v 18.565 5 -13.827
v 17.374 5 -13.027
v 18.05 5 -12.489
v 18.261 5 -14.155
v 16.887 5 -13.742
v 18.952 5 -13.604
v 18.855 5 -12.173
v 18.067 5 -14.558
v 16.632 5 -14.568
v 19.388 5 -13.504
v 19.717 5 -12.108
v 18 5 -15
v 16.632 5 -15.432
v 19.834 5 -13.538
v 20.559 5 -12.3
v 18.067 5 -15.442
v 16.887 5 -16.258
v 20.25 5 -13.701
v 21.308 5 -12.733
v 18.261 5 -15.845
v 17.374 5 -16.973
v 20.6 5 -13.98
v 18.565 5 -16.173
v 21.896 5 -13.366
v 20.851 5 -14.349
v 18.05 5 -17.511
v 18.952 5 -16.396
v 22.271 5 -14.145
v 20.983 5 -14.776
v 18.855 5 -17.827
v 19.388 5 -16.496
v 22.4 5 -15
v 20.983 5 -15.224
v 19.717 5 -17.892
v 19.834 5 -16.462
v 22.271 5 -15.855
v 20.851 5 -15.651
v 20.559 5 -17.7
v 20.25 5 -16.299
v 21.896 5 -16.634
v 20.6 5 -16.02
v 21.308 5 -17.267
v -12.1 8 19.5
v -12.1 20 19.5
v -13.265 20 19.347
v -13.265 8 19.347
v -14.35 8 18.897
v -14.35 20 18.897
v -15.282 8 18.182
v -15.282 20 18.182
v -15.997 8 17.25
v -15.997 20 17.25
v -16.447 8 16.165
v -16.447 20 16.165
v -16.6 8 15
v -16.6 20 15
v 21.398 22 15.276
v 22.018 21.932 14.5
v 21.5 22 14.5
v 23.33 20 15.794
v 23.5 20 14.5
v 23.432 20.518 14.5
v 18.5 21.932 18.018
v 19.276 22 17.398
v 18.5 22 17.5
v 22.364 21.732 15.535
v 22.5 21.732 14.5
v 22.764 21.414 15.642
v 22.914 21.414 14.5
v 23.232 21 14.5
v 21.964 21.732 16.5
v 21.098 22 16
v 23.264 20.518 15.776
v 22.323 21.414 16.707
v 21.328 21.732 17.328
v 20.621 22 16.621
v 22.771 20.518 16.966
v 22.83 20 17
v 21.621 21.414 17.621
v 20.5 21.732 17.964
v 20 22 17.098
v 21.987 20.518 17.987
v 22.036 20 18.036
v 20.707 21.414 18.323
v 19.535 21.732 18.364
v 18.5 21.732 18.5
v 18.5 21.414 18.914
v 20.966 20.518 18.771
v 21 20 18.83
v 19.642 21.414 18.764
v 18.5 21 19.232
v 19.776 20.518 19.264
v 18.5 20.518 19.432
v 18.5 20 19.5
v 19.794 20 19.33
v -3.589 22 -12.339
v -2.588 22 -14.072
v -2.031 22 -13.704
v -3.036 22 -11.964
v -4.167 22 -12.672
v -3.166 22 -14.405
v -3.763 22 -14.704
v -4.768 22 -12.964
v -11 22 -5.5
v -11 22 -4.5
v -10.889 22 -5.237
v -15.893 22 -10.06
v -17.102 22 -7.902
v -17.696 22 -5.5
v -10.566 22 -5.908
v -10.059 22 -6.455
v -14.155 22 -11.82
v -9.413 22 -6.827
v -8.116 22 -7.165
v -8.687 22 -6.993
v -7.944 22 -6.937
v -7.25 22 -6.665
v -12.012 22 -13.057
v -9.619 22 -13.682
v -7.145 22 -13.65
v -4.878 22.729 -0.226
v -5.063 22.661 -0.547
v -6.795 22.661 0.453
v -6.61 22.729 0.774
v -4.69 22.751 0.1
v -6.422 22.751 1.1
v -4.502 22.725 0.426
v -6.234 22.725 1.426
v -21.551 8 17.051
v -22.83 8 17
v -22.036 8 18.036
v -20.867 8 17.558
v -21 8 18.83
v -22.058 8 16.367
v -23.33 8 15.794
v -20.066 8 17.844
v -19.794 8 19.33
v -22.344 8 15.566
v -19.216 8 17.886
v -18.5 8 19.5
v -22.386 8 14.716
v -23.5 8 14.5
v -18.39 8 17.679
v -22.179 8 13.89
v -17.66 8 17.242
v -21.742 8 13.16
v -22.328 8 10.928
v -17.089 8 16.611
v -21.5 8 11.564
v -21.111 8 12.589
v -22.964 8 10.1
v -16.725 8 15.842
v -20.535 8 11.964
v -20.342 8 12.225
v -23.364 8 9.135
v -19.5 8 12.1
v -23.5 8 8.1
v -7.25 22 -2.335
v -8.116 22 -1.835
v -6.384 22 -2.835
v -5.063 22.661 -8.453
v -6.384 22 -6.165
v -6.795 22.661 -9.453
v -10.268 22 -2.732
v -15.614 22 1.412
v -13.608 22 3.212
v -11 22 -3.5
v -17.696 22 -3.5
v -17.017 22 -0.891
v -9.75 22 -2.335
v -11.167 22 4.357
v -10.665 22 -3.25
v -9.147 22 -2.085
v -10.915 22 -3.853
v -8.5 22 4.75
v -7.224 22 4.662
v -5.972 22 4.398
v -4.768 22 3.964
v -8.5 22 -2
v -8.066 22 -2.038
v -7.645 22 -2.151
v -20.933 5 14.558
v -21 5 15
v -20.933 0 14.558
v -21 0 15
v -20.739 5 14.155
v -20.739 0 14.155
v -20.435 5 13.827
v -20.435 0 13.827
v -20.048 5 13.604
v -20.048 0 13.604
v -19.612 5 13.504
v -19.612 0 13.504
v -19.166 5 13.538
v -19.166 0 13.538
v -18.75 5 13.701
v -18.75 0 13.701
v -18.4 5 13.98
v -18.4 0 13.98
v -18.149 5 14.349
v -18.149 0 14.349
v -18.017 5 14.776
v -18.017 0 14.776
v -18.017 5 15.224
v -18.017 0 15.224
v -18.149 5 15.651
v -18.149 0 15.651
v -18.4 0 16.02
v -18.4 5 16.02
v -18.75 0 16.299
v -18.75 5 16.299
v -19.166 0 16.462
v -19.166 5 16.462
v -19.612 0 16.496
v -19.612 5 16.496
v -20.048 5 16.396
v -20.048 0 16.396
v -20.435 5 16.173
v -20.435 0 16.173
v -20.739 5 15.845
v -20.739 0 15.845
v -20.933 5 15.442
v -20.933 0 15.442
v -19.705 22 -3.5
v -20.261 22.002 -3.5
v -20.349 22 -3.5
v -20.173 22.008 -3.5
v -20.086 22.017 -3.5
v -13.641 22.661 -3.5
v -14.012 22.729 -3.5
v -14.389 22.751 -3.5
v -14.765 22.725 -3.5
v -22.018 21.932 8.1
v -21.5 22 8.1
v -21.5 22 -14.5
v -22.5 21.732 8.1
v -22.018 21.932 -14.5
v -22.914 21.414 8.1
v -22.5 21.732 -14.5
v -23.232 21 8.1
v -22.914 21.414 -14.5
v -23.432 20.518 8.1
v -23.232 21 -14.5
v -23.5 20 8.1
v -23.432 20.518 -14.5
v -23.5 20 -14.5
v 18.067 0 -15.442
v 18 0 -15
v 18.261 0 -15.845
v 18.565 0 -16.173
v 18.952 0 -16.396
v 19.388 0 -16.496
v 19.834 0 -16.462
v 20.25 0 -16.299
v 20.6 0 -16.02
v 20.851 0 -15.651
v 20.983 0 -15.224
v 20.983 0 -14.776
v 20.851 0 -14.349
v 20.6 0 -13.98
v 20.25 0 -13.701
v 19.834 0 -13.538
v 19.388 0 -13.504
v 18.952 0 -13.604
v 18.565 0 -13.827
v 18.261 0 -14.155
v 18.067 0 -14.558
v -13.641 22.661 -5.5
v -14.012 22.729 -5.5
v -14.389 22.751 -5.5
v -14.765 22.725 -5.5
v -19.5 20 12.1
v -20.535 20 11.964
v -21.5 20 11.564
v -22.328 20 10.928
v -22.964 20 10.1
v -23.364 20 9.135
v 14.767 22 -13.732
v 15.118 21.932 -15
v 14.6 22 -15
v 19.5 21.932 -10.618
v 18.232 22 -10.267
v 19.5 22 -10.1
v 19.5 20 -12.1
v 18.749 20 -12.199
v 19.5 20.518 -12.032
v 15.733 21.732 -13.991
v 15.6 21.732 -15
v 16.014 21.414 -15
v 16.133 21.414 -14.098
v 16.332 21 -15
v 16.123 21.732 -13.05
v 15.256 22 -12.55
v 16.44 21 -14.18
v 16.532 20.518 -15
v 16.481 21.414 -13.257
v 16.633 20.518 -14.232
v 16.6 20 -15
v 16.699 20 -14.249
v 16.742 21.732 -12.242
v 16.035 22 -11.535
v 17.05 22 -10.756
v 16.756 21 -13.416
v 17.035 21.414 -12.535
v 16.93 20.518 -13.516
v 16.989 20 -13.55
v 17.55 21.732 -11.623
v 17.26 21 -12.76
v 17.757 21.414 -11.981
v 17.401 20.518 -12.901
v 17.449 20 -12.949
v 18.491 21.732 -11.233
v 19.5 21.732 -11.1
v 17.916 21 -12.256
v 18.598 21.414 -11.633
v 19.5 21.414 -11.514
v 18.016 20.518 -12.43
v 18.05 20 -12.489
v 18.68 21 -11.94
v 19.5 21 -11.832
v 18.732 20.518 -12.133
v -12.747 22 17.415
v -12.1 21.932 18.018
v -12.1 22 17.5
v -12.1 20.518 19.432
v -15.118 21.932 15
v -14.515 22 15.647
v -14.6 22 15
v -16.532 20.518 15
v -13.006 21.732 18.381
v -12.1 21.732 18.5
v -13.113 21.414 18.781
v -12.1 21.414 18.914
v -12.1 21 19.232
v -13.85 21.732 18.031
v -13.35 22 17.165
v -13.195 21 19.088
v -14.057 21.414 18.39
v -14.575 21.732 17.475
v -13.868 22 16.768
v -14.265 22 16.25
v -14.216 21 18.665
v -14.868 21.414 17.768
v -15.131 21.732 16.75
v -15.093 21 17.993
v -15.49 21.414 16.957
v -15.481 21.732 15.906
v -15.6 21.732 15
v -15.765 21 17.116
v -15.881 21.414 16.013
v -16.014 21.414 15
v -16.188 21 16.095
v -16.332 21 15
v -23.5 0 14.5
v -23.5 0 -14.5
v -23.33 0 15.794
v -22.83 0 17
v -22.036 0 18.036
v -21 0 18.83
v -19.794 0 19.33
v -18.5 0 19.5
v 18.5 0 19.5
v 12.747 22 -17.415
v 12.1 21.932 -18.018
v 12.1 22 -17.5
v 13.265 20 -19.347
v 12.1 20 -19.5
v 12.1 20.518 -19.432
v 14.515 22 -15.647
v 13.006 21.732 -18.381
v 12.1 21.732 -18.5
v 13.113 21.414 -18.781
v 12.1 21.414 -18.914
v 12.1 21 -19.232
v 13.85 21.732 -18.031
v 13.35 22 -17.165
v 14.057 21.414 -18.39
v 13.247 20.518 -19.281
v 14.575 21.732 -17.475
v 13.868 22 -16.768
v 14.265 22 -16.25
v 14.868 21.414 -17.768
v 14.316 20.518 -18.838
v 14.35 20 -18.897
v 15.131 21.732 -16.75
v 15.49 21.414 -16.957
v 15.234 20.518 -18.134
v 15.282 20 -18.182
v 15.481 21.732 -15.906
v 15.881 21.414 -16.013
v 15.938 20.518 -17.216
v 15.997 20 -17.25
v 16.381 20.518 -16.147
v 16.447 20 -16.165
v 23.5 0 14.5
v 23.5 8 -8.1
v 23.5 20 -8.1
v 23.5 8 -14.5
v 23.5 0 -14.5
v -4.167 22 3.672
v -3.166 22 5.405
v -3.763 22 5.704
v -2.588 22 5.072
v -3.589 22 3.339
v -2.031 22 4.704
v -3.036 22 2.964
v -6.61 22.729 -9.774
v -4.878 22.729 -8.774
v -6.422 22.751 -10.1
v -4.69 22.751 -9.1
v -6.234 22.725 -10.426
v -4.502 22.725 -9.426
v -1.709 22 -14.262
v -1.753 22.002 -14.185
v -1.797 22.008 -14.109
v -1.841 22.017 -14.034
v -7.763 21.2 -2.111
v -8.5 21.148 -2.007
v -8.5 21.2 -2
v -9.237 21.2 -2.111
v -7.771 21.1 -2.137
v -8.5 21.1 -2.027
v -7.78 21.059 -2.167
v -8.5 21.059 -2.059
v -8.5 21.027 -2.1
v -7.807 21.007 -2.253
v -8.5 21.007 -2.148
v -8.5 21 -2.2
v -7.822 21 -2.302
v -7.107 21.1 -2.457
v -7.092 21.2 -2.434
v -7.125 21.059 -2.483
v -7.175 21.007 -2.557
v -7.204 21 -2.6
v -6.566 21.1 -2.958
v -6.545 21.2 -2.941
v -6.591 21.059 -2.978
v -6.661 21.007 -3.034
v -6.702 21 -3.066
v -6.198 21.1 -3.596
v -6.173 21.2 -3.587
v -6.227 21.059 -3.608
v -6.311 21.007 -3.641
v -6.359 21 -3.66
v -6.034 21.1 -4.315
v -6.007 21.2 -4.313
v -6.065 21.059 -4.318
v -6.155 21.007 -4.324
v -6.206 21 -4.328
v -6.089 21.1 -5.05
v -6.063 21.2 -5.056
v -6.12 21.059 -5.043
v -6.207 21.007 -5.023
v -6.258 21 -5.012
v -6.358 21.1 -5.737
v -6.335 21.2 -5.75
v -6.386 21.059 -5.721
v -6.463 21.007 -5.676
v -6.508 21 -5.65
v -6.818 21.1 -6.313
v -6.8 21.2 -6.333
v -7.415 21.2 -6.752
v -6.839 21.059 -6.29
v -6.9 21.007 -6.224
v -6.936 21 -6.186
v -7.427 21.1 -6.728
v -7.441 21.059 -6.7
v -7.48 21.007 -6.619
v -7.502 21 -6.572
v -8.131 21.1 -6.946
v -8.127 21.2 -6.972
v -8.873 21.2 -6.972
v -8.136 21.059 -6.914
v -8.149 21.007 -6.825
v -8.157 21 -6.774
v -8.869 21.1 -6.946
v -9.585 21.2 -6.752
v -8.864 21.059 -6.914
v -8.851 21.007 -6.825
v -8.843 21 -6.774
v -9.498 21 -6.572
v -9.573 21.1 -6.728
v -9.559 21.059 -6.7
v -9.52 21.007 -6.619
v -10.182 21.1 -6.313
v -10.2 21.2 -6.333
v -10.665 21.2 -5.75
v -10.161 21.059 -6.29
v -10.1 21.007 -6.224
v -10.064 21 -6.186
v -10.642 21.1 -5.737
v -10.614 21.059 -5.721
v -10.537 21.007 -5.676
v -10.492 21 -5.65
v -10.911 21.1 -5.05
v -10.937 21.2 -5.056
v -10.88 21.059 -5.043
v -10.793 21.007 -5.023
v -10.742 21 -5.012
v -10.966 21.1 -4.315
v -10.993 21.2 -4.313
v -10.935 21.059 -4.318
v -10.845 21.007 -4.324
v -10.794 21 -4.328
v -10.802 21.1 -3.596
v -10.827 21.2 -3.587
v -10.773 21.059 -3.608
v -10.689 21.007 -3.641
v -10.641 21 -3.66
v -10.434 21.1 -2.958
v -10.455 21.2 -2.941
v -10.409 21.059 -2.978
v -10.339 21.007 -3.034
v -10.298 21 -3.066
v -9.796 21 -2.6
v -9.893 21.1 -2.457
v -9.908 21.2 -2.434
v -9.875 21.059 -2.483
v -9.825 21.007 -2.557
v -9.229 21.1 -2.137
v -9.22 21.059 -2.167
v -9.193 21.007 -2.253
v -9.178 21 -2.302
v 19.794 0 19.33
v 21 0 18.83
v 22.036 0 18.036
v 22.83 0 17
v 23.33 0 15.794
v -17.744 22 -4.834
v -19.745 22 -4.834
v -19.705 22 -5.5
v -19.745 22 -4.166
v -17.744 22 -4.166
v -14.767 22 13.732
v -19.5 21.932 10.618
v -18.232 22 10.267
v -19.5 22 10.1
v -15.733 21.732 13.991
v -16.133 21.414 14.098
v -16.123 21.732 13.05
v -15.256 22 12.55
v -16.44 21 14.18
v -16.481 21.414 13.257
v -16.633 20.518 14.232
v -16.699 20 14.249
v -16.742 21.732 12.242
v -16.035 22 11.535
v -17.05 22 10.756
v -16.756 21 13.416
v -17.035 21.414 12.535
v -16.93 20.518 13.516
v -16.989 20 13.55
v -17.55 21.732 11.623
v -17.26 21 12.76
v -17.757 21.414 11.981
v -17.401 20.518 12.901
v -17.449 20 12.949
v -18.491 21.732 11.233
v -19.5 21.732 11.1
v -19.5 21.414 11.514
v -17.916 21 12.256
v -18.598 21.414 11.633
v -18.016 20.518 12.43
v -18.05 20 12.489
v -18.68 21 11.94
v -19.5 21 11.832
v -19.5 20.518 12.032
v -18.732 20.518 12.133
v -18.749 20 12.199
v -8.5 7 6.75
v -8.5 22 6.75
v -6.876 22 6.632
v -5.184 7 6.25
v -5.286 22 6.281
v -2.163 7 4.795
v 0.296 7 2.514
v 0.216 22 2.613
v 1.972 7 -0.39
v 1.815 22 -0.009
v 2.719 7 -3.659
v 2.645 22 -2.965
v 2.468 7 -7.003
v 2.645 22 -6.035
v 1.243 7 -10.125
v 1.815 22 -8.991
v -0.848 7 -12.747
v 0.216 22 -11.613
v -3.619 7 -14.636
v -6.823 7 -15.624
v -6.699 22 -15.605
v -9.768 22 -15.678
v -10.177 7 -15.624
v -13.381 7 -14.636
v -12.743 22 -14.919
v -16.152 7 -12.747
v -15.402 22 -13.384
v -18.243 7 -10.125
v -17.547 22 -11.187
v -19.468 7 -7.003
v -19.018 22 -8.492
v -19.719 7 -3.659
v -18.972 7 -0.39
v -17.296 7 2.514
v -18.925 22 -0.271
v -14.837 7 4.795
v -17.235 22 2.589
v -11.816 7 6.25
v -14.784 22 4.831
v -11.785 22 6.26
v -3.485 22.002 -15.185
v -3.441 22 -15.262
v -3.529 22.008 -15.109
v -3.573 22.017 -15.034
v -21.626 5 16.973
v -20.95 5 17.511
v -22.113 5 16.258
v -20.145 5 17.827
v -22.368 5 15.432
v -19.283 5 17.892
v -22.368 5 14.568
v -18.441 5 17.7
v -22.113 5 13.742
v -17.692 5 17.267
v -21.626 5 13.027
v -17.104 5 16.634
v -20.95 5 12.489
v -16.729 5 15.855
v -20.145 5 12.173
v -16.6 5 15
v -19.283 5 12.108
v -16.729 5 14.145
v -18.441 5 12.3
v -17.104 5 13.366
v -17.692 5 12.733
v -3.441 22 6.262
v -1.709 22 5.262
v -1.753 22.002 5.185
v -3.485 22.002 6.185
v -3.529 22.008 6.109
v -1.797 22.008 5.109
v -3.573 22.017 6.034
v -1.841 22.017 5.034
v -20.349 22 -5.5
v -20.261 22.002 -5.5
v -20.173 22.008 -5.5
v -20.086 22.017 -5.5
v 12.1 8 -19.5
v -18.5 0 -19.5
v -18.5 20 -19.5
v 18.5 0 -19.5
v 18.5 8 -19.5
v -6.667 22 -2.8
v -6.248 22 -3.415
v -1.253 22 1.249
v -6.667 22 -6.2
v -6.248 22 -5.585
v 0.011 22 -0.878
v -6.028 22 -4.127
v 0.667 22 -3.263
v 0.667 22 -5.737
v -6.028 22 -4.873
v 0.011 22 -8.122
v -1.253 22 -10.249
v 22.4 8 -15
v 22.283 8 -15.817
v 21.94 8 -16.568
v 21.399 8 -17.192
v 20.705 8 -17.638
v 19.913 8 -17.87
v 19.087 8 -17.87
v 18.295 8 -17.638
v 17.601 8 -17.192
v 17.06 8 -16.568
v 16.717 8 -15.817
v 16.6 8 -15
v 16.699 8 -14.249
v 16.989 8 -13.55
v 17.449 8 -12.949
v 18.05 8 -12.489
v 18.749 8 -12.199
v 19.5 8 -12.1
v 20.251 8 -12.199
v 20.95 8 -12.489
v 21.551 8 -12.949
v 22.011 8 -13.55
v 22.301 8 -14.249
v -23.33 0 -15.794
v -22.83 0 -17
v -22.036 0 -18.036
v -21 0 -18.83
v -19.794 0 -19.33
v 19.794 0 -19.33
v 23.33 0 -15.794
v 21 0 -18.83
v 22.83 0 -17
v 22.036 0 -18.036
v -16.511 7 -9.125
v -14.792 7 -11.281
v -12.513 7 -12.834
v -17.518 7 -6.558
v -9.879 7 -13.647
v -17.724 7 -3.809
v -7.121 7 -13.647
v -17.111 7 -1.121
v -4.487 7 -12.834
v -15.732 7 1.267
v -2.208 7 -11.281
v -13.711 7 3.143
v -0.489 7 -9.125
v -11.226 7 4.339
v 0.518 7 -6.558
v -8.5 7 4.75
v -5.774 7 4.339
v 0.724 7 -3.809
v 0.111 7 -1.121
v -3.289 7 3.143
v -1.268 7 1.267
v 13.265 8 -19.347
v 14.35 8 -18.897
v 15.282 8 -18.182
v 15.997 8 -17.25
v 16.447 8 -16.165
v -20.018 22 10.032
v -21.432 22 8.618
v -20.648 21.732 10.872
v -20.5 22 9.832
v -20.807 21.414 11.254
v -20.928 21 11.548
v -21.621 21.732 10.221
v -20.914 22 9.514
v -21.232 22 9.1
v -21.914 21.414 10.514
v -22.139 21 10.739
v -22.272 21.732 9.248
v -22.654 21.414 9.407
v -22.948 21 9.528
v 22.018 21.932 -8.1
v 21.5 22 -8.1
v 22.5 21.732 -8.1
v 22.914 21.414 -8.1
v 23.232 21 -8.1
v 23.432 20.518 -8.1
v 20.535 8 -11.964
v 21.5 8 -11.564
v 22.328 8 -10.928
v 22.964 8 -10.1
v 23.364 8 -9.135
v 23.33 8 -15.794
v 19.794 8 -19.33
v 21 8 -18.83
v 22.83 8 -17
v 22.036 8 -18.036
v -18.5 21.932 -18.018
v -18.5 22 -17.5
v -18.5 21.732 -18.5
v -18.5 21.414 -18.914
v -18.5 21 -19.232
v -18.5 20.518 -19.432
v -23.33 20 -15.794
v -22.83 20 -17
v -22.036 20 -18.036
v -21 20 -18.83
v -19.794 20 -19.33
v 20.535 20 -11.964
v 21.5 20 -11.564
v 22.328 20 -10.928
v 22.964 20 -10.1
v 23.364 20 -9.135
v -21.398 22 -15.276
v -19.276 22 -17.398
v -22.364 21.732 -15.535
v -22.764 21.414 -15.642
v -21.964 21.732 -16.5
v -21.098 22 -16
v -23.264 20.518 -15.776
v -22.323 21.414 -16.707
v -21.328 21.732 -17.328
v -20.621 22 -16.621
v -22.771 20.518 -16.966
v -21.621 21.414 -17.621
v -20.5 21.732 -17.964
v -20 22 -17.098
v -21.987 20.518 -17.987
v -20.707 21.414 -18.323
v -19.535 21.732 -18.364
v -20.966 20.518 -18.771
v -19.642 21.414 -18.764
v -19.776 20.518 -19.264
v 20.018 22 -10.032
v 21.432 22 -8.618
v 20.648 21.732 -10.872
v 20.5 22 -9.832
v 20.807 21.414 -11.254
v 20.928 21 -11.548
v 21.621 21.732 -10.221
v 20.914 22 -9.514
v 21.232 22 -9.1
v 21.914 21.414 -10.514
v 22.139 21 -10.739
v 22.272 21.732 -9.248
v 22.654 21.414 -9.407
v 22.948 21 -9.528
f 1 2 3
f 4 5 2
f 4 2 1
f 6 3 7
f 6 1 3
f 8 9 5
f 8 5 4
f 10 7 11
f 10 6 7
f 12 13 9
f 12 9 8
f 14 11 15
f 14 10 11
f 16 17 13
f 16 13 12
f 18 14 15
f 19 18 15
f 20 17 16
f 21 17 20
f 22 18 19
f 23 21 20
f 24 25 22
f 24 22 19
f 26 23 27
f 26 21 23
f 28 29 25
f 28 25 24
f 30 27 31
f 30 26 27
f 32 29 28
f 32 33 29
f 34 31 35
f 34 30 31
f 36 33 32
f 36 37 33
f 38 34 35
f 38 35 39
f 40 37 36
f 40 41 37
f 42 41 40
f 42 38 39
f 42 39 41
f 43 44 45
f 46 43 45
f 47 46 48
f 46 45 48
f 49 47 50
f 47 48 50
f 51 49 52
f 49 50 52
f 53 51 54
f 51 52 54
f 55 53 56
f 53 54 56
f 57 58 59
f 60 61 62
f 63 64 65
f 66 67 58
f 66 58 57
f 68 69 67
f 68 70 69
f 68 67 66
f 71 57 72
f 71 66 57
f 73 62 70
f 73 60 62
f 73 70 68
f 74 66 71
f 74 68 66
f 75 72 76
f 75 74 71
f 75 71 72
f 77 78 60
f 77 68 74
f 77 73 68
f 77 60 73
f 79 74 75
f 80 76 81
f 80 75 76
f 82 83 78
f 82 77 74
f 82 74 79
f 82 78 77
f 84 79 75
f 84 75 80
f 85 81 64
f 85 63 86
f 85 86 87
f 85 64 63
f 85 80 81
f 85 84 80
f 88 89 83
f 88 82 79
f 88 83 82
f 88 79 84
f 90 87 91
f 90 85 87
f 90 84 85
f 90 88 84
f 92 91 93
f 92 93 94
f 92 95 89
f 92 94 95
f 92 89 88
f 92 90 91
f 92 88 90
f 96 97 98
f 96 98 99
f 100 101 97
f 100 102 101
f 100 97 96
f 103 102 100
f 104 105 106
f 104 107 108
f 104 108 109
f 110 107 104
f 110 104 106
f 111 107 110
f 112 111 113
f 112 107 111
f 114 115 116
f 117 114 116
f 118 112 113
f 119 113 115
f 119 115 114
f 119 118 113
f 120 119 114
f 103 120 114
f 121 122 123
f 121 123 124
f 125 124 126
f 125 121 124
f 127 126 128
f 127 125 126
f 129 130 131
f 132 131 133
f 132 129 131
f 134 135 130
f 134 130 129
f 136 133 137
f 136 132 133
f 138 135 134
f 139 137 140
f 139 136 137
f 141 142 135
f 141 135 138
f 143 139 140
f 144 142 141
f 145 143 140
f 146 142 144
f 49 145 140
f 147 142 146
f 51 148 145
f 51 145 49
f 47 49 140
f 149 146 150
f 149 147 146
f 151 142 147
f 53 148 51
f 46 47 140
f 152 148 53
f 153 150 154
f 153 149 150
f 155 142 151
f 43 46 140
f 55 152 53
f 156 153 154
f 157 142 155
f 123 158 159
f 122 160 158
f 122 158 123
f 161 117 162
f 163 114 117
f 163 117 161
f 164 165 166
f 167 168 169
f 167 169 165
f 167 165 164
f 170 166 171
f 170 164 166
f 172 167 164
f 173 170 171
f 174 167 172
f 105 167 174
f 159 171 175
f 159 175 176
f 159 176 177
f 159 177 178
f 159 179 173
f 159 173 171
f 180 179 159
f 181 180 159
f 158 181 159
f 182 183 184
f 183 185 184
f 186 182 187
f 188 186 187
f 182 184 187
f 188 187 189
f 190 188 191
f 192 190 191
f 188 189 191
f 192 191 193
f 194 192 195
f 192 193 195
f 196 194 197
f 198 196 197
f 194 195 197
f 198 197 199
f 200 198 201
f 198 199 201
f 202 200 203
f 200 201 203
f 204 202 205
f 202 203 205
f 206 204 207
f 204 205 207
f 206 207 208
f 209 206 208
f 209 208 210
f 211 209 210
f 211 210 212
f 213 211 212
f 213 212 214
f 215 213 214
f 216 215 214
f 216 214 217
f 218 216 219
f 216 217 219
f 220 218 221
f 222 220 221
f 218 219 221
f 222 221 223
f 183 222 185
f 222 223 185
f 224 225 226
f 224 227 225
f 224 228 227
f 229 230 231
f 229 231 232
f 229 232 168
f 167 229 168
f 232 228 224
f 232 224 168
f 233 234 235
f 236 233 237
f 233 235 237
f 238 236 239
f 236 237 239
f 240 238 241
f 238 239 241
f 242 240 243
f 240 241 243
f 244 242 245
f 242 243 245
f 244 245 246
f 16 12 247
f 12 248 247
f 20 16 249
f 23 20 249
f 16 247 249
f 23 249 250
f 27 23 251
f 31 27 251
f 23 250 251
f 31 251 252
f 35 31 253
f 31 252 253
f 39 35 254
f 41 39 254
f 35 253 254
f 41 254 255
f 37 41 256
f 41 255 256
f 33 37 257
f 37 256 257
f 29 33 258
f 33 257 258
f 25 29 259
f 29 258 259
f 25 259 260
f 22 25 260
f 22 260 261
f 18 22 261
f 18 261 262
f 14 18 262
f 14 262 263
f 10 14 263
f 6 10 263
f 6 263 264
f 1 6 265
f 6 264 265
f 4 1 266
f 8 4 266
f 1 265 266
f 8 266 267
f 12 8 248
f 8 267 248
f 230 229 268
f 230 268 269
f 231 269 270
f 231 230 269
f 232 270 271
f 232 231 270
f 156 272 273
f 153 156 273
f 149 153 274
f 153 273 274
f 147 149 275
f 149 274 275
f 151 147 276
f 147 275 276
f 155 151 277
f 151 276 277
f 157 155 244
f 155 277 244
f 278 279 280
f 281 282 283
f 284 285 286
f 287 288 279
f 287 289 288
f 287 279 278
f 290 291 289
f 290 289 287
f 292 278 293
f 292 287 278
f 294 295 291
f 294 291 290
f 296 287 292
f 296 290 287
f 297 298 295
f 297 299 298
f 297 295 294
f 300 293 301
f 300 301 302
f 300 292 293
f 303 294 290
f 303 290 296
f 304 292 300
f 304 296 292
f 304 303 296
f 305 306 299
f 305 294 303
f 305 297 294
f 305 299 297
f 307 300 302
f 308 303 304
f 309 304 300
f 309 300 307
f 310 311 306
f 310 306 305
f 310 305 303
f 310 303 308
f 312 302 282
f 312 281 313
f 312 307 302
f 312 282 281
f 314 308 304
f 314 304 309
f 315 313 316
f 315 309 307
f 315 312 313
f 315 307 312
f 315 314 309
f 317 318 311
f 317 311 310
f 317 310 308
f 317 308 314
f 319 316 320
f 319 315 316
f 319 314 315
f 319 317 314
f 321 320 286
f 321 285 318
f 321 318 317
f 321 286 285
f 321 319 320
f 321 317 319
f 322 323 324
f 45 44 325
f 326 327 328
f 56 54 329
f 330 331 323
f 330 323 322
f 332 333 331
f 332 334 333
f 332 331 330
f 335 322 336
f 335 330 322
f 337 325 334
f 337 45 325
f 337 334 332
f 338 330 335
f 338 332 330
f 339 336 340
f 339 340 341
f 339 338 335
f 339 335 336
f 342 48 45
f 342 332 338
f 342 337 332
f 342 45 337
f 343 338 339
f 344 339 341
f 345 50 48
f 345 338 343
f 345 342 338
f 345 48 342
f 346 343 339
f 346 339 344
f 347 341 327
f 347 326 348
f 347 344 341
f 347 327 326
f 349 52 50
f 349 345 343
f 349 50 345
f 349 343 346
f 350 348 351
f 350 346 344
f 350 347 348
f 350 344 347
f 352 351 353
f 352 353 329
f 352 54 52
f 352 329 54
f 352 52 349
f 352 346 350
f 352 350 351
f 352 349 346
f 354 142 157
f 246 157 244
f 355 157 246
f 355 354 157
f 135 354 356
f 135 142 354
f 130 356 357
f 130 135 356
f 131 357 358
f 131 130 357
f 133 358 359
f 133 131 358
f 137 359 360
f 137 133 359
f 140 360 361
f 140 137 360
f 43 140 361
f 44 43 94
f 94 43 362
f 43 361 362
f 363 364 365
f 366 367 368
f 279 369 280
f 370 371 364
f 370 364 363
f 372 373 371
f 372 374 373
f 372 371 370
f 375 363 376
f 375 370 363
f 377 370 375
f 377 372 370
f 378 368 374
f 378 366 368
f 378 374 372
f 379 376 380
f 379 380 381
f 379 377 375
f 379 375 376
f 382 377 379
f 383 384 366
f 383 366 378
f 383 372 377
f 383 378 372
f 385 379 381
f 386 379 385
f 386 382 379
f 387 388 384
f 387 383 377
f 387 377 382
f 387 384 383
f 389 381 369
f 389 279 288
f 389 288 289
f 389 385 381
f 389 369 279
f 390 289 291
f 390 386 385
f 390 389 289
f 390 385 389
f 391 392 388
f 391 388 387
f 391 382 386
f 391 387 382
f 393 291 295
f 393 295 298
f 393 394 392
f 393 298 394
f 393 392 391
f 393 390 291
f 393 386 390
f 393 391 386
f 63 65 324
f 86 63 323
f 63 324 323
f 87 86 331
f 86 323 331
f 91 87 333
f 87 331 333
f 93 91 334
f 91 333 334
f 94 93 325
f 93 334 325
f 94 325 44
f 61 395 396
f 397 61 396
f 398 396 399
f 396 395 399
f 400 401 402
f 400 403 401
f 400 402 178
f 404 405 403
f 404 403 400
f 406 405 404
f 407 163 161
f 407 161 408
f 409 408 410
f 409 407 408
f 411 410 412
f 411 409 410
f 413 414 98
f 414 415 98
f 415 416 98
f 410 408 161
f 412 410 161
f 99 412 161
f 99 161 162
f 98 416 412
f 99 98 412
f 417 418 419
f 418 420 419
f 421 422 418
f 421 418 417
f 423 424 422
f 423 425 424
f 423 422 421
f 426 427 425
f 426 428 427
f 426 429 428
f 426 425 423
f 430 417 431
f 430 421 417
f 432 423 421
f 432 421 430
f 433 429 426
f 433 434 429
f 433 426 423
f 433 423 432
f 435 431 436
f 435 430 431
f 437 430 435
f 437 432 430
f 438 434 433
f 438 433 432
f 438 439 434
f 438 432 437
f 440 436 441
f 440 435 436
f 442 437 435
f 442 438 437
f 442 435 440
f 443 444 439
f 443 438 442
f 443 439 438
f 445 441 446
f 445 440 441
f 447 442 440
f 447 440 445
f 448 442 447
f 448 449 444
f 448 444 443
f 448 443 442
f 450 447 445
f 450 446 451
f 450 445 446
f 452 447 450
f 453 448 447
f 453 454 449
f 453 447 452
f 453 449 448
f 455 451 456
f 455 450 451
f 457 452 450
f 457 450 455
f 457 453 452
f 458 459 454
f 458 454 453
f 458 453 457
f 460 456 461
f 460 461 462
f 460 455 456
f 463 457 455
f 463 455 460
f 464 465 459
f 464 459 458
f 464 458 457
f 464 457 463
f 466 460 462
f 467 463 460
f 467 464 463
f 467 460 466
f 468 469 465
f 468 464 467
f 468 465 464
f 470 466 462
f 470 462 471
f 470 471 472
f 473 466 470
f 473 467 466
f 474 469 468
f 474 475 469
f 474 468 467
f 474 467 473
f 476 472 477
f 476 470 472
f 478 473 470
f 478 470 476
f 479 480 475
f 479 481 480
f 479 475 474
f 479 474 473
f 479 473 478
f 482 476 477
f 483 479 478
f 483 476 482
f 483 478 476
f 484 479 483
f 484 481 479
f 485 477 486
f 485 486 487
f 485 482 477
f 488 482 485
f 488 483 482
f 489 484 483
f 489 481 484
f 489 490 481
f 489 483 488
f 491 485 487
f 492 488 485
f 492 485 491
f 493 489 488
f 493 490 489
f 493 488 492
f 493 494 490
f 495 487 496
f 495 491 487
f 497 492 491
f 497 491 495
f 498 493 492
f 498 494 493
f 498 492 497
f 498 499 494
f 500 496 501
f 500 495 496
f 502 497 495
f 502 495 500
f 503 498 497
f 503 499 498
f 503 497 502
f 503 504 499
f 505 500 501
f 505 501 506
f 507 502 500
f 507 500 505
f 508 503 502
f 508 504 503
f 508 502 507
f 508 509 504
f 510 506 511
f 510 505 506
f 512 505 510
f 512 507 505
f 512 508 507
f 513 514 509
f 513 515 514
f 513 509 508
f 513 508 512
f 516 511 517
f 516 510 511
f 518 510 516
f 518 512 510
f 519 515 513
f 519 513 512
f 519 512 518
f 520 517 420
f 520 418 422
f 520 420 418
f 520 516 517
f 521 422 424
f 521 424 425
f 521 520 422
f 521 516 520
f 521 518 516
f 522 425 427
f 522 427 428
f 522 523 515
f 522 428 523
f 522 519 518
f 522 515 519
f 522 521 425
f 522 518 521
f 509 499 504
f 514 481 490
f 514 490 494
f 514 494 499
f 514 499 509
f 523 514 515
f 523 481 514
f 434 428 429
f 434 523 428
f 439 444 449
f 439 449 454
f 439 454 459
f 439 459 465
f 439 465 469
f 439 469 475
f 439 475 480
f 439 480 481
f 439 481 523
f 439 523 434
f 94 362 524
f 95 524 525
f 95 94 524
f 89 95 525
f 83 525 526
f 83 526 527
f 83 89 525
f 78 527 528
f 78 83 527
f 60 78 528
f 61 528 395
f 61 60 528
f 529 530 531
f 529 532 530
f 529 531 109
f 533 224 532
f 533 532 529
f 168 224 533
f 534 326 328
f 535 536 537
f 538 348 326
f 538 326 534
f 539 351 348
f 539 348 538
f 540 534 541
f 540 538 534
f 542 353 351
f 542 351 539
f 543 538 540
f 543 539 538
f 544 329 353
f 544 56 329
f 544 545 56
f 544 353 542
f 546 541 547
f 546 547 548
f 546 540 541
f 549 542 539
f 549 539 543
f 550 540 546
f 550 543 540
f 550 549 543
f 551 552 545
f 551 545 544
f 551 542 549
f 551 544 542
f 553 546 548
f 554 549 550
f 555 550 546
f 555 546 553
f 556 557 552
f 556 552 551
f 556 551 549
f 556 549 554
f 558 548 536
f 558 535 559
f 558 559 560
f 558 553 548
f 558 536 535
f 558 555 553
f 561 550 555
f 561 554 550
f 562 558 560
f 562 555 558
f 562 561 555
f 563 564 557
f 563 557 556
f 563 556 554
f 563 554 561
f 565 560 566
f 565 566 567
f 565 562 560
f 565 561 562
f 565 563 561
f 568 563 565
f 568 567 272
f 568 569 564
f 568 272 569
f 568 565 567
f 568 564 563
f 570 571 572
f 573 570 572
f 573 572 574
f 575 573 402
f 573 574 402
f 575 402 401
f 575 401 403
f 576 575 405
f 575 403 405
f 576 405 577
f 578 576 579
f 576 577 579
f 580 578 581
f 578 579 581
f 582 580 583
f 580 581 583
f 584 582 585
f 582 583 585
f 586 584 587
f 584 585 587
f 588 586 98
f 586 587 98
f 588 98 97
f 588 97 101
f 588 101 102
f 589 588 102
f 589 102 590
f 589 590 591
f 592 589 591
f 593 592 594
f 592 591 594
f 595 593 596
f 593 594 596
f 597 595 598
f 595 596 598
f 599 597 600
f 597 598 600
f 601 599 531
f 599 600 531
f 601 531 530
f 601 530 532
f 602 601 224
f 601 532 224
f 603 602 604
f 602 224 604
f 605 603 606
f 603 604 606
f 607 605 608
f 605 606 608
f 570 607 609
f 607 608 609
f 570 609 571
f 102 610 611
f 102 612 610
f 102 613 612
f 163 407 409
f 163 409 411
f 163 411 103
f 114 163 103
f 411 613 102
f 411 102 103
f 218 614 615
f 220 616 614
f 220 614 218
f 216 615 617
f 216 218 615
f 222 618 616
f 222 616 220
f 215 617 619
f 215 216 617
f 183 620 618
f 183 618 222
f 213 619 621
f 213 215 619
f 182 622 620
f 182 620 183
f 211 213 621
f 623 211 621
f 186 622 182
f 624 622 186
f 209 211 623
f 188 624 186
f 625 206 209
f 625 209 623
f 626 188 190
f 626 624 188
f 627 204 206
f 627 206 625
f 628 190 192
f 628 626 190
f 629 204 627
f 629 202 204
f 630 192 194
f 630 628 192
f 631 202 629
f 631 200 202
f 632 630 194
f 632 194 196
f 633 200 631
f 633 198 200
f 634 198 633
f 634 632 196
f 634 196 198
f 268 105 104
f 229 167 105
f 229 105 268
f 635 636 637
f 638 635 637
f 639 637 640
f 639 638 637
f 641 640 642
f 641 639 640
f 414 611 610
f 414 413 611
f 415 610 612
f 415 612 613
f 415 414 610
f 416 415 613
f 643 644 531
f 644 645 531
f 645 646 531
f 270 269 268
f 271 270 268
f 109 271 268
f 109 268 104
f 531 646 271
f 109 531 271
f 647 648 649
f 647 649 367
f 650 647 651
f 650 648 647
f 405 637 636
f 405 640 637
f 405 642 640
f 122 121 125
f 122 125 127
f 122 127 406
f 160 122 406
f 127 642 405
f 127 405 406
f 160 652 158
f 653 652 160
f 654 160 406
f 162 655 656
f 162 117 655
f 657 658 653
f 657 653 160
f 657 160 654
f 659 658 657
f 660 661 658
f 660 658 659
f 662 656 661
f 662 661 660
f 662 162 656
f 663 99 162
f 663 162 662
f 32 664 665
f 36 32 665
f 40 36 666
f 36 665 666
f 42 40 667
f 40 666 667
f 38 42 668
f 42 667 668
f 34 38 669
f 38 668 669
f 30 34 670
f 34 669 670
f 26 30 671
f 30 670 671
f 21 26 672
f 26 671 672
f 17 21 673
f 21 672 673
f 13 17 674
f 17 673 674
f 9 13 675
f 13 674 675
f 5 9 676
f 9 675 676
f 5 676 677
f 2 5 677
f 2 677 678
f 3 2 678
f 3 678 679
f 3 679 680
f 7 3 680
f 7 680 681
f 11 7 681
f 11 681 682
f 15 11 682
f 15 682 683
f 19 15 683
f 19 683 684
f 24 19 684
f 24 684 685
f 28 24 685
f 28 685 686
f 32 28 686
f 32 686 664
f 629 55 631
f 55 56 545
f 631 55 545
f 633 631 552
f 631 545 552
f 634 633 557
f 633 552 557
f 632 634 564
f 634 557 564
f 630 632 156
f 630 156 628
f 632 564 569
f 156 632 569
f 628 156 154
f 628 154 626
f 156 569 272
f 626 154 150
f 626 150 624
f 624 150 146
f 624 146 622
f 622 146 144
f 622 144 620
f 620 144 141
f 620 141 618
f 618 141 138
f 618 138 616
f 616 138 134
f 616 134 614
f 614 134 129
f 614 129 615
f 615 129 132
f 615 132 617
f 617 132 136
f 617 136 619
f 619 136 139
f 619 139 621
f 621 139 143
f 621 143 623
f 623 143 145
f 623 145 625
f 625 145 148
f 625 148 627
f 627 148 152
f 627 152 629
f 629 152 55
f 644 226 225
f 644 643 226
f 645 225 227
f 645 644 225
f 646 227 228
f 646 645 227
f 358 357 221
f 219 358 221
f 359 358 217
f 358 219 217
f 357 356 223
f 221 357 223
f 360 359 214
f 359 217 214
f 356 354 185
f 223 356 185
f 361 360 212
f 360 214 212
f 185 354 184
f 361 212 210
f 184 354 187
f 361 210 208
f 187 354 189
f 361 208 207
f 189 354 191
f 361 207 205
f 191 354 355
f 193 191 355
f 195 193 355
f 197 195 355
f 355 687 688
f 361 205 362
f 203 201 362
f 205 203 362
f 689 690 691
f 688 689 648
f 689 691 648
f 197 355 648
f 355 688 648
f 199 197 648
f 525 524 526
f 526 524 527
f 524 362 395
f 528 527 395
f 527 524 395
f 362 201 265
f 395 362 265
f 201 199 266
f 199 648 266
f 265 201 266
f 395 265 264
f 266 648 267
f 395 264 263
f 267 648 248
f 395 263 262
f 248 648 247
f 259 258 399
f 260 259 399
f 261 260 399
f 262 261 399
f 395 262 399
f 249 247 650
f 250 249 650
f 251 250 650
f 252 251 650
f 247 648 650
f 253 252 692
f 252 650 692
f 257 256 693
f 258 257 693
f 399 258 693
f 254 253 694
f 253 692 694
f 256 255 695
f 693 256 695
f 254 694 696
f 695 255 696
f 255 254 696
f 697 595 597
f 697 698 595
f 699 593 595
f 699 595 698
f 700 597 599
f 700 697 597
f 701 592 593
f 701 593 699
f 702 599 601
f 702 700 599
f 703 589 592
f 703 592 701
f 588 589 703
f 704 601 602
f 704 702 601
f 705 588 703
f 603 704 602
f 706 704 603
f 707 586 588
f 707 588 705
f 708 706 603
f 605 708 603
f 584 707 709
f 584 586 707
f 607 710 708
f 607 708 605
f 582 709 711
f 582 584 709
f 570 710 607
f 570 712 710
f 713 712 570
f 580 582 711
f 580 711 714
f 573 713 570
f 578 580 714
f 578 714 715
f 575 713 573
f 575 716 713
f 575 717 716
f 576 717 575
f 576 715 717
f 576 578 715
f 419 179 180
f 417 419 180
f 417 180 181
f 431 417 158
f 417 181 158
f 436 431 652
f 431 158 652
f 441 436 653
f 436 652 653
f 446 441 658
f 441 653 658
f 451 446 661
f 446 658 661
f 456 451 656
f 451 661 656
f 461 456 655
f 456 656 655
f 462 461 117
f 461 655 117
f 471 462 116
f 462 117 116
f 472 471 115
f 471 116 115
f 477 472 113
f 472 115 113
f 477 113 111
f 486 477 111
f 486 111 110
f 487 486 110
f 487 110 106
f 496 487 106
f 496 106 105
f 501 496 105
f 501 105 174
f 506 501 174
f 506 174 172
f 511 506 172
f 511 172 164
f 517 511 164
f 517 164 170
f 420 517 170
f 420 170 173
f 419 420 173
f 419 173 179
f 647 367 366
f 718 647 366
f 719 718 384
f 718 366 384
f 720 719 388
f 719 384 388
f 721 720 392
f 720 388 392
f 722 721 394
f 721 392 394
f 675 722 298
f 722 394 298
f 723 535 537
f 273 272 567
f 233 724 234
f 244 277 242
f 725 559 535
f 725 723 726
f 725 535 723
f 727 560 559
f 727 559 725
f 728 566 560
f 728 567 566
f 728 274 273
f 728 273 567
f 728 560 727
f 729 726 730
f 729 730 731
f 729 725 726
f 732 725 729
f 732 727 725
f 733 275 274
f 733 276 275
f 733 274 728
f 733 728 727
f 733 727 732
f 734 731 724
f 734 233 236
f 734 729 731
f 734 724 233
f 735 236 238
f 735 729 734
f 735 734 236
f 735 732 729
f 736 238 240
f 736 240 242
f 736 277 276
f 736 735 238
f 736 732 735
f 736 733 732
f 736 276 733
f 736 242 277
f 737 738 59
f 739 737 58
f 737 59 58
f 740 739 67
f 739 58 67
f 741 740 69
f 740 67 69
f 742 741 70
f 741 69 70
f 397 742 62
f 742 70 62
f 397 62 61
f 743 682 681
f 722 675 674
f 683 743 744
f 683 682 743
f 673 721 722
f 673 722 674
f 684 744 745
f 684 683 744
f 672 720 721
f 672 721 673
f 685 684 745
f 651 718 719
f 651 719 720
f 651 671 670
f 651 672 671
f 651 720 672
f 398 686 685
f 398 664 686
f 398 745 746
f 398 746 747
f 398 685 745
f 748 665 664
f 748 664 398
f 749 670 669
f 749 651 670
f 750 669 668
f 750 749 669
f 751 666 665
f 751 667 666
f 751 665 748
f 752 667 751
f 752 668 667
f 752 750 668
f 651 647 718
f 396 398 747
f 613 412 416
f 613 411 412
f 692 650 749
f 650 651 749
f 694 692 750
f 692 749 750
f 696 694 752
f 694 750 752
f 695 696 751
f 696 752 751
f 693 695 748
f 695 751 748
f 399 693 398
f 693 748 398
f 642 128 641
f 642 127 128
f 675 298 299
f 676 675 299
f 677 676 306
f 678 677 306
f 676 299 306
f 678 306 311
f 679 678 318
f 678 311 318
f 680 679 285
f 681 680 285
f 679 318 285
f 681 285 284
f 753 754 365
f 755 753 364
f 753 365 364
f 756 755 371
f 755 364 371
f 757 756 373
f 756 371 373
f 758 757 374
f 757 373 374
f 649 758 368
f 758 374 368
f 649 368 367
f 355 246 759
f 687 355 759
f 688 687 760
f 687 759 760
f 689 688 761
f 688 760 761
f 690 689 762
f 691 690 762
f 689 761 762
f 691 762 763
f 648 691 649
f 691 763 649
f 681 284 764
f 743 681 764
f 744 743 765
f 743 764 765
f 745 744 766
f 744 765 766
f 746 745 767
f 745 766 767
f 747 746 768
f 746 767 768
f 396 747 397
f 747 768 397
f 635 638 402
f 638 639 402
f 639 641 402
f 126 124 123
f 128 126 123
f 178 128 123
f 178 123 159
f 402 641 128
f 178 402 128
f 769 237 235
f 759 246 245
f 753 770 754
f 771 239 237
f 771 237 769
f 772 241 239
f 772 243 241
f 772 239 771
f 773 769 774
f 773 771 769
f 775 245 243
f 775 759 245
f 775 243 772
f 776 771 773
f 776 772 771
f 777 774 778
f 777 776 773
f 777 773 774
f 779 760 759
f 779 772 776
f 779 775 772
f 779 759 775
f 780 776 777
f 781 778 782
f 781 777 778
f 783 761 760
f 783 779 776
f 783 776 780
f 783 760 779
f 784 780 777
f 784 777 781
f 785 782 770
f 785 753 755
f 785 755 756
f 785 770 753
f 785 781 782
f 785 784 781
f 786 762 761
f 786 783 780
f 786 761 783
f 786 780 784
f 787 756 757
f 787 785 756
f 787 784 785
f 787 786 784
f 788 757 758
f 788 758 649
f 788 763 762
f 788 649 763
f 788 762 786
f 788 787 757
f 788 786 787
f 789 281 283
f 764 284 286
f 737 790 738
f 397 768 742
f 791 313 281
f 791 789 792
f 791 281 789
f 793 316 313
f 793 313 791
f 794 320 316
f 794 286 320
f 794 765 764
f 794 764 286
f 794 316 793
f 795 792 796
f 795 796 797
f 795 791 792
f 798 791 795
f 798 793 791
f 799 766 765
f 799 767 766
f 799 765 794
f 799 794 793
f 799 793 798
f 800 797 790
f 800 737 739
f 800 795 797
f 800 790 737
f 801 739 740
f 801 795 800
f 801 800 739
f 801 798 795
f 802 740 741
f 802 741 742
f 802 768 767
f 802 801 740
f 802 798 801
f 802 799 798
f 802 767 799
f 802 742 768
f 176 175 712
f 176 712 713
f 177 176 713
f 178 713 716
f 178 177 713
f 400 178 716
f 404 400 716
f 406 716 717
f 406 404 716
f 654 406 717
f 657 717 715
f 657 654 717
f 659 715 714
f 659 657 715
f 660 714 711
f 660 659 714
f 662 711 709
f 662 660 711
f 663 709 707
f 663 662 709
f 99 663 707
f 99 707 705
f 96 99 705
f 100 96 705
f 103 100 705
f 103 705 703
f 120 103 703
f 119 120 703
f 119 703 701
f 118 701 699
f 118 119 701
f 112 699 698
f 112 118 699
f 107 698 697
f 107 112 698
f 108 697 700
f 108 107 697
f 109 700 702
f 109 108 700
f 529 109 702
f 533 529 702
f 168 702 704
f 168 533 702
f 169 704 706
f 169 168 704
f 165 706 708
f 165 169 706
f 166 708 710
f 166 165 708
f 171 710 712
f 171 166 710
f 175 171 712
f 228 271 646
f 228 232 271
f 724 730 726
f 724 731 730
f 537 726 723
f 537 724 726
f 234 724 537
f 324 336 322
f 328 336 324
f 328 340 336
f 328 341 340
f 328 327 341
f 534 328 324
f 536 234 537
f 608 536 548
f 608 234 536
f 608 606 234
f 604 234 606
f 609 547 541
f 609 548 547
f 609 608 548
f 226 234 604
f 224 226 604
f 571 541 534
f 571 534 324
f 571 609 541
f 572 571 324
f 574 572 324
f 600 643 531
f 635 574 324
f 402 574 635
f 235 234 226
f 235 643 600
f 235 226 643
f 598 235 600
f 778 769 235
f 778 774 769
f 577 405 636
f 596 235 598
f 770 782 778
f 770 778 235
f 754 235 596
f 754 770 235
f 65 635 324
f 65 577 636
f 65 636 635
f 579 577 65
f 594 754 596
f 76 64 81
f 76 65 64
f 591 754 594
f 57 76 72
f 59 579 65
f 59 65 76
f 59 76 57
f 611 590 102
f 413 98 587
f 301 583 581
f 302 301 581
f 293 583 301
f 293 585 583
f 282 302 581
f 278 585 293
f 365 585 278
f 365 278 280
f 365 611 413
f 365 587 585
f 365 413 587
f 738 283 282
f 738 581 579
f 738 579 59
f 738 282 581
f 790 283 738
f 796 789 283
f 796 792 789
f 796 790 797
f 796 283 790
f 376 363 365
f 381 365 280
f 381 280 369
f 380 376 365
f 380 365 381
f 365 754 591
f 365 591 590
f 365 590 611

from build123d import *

# Parameters (mm, degrees)
ESQUISSE1_W                                        = 47
ESQUISSE1_H                                        = 39
BOSS_EXTRU_1_DEPTH                                 = 22
CHAMBRAGE_POUR_VIS_T_TE_RONDE_BOMB_E_M_D           = 3
CHAMBRAGE_POUR_VIS_T_TE_RONDE_BOMB_E_M_CBORE_D     = 5.8
CHAMBRAGE_POUR_VIS_T_TE_RONDE_BOMB_E_M_CBORE_DEPTH = 17
ENL_V_MAT_EXTRU_1_DEPTH                            = 14
CONG_1_R                                           = 5
CONG_2_R                                           = 2
ESQUISSE6_R                                        = 11.25
ESQUISSE6_R_2                                      = 9.25
ENL_V_MAT_EXTRU_2_DEPTH                            = 15
ESQUISSE8_R                                        = 2.5
ENL_V_MAT_EXTRU_3_DEPTH                            = 1
BOSS_EXTRU_5_DEPTH                                 = 1
R_P_TITION_CIRCULAIRE1_COUNT                       = 3
CONG_3_R                                           = 2
CONG_4_R                                           = 0.2


with BuildPart() as part:
    # Esquisse1 → Boss.-Extru.1 (new body)
    with BuildSketch(Plane(origin=(0, 0, 0), x_dir=(1, 0, 0), z_dir=(0, 1, 0))):
        Rectangle(ESQUISSE1_W, ESQUISSE1_H)
    extrude(amount=BOSS_EXTRU_1_DEPTH)

    # Chambrage pour vis à tête ronde bombée M31 (through all)
    with Locations(Plane(origin=(0, 22, 0), x_dir=(1, 0, 0), z_dir=(0, 1, 0))):
        with Locations((-19.5, -15), (19.5, 15)):
            CounterBoreHole(CHAMBRAGE_POUR_VIS_T_TE_RONDE_BOMB_E_M_D / 2, CHAMBRAGE_POUR_VIS_T_TE_RONDE_BOMB_E_M_CBORE_D / 2, CHAMBRAGE_POUR_VIS_T_TE_RONDE_BOMB_E_M_CBORE_DEPTH)

    # Esquisse5 → Enlèv. mat.-Extru.1 (cut)
    with BuildSketch(Plane(origin=(0, 22, 0), x_dir=(1, 0, 0), z_dir=(0, 1, 0))):
        with BuildLine():
            Line((-23.5, -8.1), (-23.5, -19.5))
            Line((-23.5, -19.5), (-12.1, -19.5))
            ThreePointArc((-12.1, -19.5), (-15.281980515, -18.181980515), (-16.6, -15))
            ThreePointArc((-16.6, -15), (-17.449390335, -12.949390335), (-19.5, -12.1))
            ThreePointArc((-19.5, -12.1), (-22.328427125, -10.928427125), (-23.5, -8.1))
        make_face()
        with BuildLine():
            Line((23.5, 8.1), (23.5, 19.5))
            Line((23.5, 19.5), (12.1, 19.5))
            ThreePointArc((12.1, 19.5), (15.281980515, 18.181980515), (16.6, 15))
            ThreePointArc((16.6, 15), (17.449390335, 12.949390335), (19.5, 12.1))
            ThreePointArc((19.5, 12.1), (22.328427125, 10.928427125), (23.5, 8.1))
        make_face()
    extrude(amount=-ENL_V_MAT_EXTRU_1_DEPTH, mode=Mode.SUBTRACT)

    # Congé1
    cong_1_edges = [part.edges().sort_by_distance(p)[0] for p in [
        (-23.5, 4, 19.5),
        (23.5, 4, -19.5),
        (23.5, 11, 19.5),
        (-23.5, 11, -19.5),
    ]]
    fillet(cong_1_edges, radius=CONG_1_R)

    # Congé2
    cong_2_edges = [part.edges().sort_by_distance(p)[0] for p in [
        (-17.449390335, 22, 12.949390335),
        (3.2, 22, 19.5),
        (-15.281980515, 22, 18.181980515),
        (-22.328427125, 22, 10.928427125),
        (17.449390335, 22, -12.949390335),
        (-3.2, 22, -19.5),
        (15.281980515, 22, -18.181980515),
        (22.328427125, 22, -10.928427125),
        (23.5, 22, 3.2),
        (-23.5, 22, -3.2),
        (-22.035533906, 22, -18.035533906),
        (22.035533906, 22, 18.035533906),
    ]]
    fillet(cong_2_edges, radius=CONG_2_R)

    # Esquisse6 → Enlèv. mat.-Extru.2 (cut)
    with BuildSketch(Plane(origin=(0, 22, 0), x_dir=(1, 0, 0), z_dir=(0, 1, 0))):
        with Locations(Location((-8.5, 4.5, 0), (0, 0, 270))):
            Circle(ESQUISSE6_R)
        with Locations(Location((-8.5, 4.5, 0), (0, 0, 270))):
            Circle(ESQUISSE6_R_2, mode=Mode.SUBTRACT)
    extrude(amount=-ENL_V_MAT_EXTRU_2_DEPTH, mode=Mode.SUBTRACT)

    # Esquisse8 → Enlèv. mat.-Extru.3 (cut)
    with BuildSketch(Plane(origin=(0, 22, 0), x_dir=(1, 0, 0), z_dir=(0, 1, 0))):
        with Locations(Location((-8.5, 4.5, 0), (0, 0, 270))):
            Circle(ESQUISSE8_R)
    extrude(amount=-ENL_V_MAT_EXTRU_3_DEPTH, mode=Mode.SUBTRACT)

    # Esquisse7 → Boss.-Extru.5 (add, symmetric)
    with BuildSketch(Plane.XY.offset(-4.5)):
        with BuildLine():
            Line((-20.21694009, 22), (-11, 22))
            Line((-11, 22), (-13.641435578, 22.66096111))
            ThreePointArc((-13.641435578, 22.66096111), (-14.200146525, 22.745896439), (-14.764873034, 22.724544554))
            Line((-14.764873034, 22.724544554), (-20.21694009, 22))
        make_face()
    boss_extru_5 = extrude(amount=BOSS_EXTRU_5_DEPTH, both=True)

    # Répétition circulaire1: Boss.-Extru.5 ×3 about axis
    r_p_tition_circulaire1_axis = Axis((-8.5, 0, -4.5), (0, 1, 0))
    for i in range(1, R_P_TITION_CIRCULAIRE1_COUNT):
        add(boss_extru_5.rotate(r_p_tition_circulaire1_axis, i * 360 / R_P_TITION_CIRCULAIRE1_COUNT))

    # Congé3
    cong_3_edges = [part.edges().sort_by_distance(p)[0] for p in [
        (-20.21694009, 22, -4.5),
        (-2.641529955, 22, 5.647167773),
        (-2.641529955, 22, -14.647167773),
    ]]
    fillet(cong_3_edges, radius=CONG_3_R)

    # Congé4
    cong_4_edges = [part.edges().sort_by_distance(p)[0] for p in [
        (-8.5, 21, -7),
    ]]
    fillet(cong_4_edges, radius=CONG_4_R)


solid = part.part
